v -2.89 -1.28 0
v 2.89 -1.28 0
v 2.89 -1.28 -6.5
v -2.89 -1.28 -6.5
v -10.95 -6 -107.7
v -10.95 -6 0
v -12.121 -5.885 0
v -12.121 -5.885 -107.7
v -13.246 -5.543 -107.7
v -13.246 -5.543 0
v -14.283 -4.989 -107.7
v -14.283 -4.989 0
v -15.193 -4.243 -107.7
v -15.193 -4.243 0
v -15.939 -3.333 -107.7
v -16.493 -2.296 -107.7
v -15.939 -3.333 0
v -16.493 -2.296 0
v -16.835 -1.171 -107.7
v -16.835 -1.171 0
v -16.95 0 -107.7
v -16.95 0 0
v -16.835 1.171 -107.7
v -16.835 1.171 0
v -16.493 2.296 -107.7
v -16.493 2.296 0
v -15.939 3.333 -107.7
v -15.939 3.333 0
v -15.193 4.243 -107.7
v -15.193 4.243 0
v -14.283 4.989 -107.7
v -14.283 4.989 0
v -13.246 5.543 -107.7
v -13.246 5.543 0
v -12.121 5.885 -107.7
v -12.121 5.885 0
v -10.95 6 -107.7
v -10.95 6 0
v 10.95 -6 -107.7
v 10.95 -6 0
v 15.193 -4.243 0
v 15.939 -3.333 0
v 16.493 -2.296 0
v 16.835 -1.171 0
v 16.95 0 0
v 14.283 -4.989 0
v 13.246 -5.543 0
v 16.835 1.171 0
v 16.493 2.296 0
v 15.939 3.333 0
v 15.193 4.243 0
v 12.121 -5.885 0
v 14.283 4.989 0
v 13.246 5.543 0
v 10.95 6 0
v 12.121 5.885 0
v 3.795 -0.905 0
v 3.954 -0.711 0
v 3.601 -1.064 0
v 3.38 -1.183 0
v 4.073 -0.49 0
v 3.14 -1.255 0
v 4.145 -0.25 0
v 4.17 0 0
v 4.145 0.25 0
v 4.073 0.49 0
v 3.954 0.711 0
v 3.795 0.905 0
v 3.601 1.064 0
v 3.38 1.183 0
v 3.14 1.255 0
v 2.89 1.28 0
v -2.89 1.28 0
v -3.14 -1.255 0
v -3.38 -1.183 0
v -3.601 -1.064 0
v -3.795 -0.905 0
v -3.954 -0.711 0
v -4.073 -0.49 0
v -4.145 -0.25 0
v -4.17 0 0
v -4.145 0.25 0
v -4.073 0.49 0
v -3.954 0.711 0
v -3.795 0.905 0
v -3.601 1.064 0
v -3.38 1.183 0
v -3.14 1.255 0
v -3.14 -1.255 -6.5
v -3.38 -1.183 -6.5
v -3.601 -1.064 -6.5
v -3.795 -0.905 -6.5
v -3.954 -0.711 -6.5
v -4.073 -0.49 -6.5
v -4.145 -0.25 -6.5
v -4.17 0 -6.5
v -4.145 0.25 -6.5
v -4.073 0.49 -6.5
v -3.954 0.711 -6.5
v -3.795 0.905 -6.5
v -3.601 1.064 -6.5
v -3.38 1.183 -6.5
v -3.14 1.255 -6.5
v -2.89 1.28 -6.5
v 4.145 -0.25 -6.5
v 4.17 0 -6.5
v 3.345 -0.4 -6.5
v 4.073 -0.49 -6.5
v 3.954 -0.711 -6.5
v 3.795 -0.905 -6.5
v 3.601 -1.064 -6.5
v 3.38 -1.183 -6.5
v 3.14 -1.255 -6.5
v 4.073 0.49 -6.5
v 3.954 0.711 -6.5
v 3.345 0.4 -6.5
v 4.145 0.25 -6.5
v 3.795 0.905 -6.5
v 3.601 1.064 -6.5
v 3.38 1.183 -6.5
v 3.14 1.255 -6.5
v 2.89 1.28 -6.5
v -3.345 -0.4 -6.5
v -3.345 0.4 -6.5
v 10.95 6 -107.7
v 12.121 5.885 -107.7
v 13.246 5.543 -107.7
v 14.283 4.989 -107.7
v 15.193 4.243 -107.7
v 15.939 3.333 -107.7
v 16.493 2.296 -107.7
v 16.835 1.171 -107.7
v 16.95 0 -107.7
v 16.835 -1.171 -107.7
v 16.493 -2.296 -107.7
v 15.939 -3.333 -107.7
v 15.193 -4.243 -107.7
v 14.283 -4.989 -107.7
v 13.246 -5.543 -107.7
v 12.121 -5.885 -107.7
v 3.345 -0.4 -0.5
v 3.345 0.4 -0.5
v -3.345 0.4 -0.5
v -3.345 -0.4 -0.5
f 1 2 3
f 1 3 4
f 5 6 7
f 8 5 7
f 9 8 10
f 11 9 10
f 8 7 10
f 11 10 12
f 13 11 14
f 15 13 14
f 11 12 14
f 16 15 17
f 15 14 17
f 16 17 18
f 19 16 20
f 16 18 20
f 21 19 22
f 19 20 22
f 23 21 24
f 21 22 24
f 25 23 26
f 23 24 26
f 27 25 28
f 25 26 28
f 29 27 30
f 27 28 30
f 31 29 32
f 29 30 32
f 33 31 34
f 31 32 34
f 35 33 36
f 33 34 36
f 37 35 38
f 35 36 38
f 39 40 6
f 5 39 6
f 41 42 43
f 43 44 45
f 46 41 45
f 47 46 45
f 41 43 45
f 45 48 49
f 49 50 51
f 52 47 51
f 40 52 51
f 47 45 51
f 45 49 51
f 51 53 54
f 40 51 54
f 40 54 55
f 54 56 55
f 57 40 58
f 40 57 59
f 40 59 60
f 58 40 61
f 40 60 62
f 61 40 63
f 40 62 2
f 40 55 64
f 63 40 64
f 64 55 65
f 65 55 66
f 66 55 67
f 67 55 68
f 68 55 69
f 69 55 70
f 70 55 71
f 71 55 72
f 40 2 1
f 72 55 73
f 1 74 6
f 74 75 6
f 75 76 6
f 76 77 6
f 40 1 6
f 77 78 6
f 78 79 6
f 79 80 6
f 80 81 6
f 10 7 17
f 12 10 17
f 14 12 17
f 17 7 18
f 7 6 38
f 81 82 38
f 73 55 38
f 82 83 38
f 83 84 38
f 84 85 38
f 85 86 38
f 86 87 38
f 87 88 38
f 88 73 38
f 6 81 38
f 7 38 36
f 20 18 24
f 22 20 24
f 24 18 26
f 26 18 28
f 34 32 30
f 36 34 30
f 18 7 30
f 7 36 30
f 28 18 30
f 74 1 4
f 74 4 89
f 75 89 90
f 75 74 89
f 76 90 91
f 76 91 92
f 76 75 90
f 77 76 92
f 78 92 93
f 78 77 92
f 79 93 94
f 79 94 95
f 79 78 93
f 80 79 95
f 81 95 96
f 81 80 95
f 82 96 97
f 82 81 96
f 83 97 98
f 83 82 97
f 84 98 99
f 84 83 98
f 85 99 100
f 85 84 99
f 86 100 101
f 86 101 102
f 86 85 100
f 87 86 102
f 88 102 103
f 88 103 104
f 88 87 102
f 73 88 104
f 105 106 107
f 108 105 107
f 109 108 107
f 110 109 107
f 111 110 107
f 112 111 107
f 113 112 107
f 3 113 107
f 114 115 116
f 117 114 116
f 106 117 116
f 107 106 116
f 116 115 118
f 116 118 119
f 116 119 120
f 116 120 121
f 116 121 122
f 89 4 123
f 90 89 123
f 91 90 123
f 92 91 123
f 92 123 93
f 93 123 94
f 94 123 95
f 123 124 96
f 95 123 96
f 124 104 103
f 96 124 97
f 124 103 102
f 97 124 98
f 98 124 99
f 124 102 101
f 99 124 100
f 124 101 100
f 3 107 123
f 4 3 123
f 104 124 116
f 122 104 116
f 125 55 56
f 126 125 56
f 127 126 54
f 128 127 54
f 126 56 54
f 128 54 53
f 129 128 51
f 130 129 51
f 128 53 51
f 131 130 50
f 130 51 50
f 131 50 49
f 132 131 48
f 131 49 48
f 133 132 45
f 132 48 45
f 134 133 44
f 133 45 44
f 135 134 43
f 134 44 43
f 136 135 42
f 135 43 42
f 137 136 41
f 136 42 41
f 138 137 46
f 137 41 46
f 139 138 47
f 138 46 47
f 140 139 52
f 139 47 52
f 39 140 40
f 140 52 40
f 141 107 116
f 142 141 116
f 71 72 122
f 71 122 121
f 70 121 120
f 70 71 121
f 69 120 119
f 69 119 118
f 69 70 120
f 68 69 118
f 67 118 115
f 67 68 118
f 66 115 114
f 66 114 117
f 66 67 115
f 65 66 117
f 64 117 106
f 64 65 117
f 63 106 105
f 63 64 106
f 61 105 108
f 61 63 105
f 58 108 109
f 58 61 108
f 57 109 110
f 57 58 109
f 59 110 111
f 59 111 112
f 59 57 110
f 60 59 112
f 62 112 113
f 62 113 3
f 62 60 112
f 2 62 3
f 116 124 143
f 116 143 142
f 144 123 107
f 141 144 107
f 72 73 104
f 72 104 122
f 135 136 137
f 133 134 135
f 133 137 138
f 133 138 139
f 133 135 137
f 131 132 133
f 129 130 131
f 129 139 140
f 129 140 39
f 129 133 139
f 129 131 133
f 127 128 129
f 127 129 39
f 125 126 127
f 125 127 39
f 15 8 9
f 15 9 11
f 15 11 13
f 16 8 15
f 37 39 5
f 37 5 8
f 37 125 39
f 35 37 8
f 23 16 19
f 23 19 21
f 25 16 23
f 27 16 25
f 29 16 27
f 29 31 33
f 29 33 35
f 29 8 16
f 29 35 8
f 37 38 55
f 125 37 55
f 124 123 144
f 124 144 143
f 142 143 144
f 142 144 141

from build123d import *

# Parameters (mm, degrees)
BOSS_EXTRUDE1_DEPTH = 107.7
CUT_EXTRUDE1_DEPTH  = 6.5
SKETCH3_W           = 6.69
SKETCH3_H           = 0.8
BOSS_EXTRUDE2_DEPTH = 6


with BuildPart() as part:
    # Sketch1 → Boss-Extrude1 (new body)
    with BuildSketch(Plane.XY):
        with BuildLine():
            Line((-10.95, 6), (10.95, 6))
            ThreePointArc((10.95, 6), (16.95, 0), (10.95, -6))
            Line((10.95, -6), (-10.95, -6))
            ThreePointArc((-10.95, -6), (-16.95, 0), (-10.95, 6))
        make_face()
    extrude(amount=-BOSS_EXTRUDE1_DEPTH)

    # Sketch2 → Cut-Extrude1 (cut)
    with BuildSketch(Plane.XY):
        with BuildLine():
            Line((-2.89, 1.28), (2.89, 1.28))
            ThreePointArc((2.89, 1.28), (4.17, 0), (2.89, -1.28))
            Line((2.89, -1.28), (-2.89, -1.28))
            ThreePointArc((-2.89, -1.28), (-4.17, 0), (-2.89, 1.28))
        make_face()
    extrude(amount=-CUT_EXTRUDE1_DEPTH, mode=Mode.SUBTRACT)

    # Sketch3 → Boss-Extrude2 (add)
    with BuildSketch(Plane.XY.offset(-6.5)):
        Rectangle(SKETCH3_W, SKETCH3_H)
    extrude(amount=BOSS_EXTRUDE2_DEPTH)


solid = part.part
